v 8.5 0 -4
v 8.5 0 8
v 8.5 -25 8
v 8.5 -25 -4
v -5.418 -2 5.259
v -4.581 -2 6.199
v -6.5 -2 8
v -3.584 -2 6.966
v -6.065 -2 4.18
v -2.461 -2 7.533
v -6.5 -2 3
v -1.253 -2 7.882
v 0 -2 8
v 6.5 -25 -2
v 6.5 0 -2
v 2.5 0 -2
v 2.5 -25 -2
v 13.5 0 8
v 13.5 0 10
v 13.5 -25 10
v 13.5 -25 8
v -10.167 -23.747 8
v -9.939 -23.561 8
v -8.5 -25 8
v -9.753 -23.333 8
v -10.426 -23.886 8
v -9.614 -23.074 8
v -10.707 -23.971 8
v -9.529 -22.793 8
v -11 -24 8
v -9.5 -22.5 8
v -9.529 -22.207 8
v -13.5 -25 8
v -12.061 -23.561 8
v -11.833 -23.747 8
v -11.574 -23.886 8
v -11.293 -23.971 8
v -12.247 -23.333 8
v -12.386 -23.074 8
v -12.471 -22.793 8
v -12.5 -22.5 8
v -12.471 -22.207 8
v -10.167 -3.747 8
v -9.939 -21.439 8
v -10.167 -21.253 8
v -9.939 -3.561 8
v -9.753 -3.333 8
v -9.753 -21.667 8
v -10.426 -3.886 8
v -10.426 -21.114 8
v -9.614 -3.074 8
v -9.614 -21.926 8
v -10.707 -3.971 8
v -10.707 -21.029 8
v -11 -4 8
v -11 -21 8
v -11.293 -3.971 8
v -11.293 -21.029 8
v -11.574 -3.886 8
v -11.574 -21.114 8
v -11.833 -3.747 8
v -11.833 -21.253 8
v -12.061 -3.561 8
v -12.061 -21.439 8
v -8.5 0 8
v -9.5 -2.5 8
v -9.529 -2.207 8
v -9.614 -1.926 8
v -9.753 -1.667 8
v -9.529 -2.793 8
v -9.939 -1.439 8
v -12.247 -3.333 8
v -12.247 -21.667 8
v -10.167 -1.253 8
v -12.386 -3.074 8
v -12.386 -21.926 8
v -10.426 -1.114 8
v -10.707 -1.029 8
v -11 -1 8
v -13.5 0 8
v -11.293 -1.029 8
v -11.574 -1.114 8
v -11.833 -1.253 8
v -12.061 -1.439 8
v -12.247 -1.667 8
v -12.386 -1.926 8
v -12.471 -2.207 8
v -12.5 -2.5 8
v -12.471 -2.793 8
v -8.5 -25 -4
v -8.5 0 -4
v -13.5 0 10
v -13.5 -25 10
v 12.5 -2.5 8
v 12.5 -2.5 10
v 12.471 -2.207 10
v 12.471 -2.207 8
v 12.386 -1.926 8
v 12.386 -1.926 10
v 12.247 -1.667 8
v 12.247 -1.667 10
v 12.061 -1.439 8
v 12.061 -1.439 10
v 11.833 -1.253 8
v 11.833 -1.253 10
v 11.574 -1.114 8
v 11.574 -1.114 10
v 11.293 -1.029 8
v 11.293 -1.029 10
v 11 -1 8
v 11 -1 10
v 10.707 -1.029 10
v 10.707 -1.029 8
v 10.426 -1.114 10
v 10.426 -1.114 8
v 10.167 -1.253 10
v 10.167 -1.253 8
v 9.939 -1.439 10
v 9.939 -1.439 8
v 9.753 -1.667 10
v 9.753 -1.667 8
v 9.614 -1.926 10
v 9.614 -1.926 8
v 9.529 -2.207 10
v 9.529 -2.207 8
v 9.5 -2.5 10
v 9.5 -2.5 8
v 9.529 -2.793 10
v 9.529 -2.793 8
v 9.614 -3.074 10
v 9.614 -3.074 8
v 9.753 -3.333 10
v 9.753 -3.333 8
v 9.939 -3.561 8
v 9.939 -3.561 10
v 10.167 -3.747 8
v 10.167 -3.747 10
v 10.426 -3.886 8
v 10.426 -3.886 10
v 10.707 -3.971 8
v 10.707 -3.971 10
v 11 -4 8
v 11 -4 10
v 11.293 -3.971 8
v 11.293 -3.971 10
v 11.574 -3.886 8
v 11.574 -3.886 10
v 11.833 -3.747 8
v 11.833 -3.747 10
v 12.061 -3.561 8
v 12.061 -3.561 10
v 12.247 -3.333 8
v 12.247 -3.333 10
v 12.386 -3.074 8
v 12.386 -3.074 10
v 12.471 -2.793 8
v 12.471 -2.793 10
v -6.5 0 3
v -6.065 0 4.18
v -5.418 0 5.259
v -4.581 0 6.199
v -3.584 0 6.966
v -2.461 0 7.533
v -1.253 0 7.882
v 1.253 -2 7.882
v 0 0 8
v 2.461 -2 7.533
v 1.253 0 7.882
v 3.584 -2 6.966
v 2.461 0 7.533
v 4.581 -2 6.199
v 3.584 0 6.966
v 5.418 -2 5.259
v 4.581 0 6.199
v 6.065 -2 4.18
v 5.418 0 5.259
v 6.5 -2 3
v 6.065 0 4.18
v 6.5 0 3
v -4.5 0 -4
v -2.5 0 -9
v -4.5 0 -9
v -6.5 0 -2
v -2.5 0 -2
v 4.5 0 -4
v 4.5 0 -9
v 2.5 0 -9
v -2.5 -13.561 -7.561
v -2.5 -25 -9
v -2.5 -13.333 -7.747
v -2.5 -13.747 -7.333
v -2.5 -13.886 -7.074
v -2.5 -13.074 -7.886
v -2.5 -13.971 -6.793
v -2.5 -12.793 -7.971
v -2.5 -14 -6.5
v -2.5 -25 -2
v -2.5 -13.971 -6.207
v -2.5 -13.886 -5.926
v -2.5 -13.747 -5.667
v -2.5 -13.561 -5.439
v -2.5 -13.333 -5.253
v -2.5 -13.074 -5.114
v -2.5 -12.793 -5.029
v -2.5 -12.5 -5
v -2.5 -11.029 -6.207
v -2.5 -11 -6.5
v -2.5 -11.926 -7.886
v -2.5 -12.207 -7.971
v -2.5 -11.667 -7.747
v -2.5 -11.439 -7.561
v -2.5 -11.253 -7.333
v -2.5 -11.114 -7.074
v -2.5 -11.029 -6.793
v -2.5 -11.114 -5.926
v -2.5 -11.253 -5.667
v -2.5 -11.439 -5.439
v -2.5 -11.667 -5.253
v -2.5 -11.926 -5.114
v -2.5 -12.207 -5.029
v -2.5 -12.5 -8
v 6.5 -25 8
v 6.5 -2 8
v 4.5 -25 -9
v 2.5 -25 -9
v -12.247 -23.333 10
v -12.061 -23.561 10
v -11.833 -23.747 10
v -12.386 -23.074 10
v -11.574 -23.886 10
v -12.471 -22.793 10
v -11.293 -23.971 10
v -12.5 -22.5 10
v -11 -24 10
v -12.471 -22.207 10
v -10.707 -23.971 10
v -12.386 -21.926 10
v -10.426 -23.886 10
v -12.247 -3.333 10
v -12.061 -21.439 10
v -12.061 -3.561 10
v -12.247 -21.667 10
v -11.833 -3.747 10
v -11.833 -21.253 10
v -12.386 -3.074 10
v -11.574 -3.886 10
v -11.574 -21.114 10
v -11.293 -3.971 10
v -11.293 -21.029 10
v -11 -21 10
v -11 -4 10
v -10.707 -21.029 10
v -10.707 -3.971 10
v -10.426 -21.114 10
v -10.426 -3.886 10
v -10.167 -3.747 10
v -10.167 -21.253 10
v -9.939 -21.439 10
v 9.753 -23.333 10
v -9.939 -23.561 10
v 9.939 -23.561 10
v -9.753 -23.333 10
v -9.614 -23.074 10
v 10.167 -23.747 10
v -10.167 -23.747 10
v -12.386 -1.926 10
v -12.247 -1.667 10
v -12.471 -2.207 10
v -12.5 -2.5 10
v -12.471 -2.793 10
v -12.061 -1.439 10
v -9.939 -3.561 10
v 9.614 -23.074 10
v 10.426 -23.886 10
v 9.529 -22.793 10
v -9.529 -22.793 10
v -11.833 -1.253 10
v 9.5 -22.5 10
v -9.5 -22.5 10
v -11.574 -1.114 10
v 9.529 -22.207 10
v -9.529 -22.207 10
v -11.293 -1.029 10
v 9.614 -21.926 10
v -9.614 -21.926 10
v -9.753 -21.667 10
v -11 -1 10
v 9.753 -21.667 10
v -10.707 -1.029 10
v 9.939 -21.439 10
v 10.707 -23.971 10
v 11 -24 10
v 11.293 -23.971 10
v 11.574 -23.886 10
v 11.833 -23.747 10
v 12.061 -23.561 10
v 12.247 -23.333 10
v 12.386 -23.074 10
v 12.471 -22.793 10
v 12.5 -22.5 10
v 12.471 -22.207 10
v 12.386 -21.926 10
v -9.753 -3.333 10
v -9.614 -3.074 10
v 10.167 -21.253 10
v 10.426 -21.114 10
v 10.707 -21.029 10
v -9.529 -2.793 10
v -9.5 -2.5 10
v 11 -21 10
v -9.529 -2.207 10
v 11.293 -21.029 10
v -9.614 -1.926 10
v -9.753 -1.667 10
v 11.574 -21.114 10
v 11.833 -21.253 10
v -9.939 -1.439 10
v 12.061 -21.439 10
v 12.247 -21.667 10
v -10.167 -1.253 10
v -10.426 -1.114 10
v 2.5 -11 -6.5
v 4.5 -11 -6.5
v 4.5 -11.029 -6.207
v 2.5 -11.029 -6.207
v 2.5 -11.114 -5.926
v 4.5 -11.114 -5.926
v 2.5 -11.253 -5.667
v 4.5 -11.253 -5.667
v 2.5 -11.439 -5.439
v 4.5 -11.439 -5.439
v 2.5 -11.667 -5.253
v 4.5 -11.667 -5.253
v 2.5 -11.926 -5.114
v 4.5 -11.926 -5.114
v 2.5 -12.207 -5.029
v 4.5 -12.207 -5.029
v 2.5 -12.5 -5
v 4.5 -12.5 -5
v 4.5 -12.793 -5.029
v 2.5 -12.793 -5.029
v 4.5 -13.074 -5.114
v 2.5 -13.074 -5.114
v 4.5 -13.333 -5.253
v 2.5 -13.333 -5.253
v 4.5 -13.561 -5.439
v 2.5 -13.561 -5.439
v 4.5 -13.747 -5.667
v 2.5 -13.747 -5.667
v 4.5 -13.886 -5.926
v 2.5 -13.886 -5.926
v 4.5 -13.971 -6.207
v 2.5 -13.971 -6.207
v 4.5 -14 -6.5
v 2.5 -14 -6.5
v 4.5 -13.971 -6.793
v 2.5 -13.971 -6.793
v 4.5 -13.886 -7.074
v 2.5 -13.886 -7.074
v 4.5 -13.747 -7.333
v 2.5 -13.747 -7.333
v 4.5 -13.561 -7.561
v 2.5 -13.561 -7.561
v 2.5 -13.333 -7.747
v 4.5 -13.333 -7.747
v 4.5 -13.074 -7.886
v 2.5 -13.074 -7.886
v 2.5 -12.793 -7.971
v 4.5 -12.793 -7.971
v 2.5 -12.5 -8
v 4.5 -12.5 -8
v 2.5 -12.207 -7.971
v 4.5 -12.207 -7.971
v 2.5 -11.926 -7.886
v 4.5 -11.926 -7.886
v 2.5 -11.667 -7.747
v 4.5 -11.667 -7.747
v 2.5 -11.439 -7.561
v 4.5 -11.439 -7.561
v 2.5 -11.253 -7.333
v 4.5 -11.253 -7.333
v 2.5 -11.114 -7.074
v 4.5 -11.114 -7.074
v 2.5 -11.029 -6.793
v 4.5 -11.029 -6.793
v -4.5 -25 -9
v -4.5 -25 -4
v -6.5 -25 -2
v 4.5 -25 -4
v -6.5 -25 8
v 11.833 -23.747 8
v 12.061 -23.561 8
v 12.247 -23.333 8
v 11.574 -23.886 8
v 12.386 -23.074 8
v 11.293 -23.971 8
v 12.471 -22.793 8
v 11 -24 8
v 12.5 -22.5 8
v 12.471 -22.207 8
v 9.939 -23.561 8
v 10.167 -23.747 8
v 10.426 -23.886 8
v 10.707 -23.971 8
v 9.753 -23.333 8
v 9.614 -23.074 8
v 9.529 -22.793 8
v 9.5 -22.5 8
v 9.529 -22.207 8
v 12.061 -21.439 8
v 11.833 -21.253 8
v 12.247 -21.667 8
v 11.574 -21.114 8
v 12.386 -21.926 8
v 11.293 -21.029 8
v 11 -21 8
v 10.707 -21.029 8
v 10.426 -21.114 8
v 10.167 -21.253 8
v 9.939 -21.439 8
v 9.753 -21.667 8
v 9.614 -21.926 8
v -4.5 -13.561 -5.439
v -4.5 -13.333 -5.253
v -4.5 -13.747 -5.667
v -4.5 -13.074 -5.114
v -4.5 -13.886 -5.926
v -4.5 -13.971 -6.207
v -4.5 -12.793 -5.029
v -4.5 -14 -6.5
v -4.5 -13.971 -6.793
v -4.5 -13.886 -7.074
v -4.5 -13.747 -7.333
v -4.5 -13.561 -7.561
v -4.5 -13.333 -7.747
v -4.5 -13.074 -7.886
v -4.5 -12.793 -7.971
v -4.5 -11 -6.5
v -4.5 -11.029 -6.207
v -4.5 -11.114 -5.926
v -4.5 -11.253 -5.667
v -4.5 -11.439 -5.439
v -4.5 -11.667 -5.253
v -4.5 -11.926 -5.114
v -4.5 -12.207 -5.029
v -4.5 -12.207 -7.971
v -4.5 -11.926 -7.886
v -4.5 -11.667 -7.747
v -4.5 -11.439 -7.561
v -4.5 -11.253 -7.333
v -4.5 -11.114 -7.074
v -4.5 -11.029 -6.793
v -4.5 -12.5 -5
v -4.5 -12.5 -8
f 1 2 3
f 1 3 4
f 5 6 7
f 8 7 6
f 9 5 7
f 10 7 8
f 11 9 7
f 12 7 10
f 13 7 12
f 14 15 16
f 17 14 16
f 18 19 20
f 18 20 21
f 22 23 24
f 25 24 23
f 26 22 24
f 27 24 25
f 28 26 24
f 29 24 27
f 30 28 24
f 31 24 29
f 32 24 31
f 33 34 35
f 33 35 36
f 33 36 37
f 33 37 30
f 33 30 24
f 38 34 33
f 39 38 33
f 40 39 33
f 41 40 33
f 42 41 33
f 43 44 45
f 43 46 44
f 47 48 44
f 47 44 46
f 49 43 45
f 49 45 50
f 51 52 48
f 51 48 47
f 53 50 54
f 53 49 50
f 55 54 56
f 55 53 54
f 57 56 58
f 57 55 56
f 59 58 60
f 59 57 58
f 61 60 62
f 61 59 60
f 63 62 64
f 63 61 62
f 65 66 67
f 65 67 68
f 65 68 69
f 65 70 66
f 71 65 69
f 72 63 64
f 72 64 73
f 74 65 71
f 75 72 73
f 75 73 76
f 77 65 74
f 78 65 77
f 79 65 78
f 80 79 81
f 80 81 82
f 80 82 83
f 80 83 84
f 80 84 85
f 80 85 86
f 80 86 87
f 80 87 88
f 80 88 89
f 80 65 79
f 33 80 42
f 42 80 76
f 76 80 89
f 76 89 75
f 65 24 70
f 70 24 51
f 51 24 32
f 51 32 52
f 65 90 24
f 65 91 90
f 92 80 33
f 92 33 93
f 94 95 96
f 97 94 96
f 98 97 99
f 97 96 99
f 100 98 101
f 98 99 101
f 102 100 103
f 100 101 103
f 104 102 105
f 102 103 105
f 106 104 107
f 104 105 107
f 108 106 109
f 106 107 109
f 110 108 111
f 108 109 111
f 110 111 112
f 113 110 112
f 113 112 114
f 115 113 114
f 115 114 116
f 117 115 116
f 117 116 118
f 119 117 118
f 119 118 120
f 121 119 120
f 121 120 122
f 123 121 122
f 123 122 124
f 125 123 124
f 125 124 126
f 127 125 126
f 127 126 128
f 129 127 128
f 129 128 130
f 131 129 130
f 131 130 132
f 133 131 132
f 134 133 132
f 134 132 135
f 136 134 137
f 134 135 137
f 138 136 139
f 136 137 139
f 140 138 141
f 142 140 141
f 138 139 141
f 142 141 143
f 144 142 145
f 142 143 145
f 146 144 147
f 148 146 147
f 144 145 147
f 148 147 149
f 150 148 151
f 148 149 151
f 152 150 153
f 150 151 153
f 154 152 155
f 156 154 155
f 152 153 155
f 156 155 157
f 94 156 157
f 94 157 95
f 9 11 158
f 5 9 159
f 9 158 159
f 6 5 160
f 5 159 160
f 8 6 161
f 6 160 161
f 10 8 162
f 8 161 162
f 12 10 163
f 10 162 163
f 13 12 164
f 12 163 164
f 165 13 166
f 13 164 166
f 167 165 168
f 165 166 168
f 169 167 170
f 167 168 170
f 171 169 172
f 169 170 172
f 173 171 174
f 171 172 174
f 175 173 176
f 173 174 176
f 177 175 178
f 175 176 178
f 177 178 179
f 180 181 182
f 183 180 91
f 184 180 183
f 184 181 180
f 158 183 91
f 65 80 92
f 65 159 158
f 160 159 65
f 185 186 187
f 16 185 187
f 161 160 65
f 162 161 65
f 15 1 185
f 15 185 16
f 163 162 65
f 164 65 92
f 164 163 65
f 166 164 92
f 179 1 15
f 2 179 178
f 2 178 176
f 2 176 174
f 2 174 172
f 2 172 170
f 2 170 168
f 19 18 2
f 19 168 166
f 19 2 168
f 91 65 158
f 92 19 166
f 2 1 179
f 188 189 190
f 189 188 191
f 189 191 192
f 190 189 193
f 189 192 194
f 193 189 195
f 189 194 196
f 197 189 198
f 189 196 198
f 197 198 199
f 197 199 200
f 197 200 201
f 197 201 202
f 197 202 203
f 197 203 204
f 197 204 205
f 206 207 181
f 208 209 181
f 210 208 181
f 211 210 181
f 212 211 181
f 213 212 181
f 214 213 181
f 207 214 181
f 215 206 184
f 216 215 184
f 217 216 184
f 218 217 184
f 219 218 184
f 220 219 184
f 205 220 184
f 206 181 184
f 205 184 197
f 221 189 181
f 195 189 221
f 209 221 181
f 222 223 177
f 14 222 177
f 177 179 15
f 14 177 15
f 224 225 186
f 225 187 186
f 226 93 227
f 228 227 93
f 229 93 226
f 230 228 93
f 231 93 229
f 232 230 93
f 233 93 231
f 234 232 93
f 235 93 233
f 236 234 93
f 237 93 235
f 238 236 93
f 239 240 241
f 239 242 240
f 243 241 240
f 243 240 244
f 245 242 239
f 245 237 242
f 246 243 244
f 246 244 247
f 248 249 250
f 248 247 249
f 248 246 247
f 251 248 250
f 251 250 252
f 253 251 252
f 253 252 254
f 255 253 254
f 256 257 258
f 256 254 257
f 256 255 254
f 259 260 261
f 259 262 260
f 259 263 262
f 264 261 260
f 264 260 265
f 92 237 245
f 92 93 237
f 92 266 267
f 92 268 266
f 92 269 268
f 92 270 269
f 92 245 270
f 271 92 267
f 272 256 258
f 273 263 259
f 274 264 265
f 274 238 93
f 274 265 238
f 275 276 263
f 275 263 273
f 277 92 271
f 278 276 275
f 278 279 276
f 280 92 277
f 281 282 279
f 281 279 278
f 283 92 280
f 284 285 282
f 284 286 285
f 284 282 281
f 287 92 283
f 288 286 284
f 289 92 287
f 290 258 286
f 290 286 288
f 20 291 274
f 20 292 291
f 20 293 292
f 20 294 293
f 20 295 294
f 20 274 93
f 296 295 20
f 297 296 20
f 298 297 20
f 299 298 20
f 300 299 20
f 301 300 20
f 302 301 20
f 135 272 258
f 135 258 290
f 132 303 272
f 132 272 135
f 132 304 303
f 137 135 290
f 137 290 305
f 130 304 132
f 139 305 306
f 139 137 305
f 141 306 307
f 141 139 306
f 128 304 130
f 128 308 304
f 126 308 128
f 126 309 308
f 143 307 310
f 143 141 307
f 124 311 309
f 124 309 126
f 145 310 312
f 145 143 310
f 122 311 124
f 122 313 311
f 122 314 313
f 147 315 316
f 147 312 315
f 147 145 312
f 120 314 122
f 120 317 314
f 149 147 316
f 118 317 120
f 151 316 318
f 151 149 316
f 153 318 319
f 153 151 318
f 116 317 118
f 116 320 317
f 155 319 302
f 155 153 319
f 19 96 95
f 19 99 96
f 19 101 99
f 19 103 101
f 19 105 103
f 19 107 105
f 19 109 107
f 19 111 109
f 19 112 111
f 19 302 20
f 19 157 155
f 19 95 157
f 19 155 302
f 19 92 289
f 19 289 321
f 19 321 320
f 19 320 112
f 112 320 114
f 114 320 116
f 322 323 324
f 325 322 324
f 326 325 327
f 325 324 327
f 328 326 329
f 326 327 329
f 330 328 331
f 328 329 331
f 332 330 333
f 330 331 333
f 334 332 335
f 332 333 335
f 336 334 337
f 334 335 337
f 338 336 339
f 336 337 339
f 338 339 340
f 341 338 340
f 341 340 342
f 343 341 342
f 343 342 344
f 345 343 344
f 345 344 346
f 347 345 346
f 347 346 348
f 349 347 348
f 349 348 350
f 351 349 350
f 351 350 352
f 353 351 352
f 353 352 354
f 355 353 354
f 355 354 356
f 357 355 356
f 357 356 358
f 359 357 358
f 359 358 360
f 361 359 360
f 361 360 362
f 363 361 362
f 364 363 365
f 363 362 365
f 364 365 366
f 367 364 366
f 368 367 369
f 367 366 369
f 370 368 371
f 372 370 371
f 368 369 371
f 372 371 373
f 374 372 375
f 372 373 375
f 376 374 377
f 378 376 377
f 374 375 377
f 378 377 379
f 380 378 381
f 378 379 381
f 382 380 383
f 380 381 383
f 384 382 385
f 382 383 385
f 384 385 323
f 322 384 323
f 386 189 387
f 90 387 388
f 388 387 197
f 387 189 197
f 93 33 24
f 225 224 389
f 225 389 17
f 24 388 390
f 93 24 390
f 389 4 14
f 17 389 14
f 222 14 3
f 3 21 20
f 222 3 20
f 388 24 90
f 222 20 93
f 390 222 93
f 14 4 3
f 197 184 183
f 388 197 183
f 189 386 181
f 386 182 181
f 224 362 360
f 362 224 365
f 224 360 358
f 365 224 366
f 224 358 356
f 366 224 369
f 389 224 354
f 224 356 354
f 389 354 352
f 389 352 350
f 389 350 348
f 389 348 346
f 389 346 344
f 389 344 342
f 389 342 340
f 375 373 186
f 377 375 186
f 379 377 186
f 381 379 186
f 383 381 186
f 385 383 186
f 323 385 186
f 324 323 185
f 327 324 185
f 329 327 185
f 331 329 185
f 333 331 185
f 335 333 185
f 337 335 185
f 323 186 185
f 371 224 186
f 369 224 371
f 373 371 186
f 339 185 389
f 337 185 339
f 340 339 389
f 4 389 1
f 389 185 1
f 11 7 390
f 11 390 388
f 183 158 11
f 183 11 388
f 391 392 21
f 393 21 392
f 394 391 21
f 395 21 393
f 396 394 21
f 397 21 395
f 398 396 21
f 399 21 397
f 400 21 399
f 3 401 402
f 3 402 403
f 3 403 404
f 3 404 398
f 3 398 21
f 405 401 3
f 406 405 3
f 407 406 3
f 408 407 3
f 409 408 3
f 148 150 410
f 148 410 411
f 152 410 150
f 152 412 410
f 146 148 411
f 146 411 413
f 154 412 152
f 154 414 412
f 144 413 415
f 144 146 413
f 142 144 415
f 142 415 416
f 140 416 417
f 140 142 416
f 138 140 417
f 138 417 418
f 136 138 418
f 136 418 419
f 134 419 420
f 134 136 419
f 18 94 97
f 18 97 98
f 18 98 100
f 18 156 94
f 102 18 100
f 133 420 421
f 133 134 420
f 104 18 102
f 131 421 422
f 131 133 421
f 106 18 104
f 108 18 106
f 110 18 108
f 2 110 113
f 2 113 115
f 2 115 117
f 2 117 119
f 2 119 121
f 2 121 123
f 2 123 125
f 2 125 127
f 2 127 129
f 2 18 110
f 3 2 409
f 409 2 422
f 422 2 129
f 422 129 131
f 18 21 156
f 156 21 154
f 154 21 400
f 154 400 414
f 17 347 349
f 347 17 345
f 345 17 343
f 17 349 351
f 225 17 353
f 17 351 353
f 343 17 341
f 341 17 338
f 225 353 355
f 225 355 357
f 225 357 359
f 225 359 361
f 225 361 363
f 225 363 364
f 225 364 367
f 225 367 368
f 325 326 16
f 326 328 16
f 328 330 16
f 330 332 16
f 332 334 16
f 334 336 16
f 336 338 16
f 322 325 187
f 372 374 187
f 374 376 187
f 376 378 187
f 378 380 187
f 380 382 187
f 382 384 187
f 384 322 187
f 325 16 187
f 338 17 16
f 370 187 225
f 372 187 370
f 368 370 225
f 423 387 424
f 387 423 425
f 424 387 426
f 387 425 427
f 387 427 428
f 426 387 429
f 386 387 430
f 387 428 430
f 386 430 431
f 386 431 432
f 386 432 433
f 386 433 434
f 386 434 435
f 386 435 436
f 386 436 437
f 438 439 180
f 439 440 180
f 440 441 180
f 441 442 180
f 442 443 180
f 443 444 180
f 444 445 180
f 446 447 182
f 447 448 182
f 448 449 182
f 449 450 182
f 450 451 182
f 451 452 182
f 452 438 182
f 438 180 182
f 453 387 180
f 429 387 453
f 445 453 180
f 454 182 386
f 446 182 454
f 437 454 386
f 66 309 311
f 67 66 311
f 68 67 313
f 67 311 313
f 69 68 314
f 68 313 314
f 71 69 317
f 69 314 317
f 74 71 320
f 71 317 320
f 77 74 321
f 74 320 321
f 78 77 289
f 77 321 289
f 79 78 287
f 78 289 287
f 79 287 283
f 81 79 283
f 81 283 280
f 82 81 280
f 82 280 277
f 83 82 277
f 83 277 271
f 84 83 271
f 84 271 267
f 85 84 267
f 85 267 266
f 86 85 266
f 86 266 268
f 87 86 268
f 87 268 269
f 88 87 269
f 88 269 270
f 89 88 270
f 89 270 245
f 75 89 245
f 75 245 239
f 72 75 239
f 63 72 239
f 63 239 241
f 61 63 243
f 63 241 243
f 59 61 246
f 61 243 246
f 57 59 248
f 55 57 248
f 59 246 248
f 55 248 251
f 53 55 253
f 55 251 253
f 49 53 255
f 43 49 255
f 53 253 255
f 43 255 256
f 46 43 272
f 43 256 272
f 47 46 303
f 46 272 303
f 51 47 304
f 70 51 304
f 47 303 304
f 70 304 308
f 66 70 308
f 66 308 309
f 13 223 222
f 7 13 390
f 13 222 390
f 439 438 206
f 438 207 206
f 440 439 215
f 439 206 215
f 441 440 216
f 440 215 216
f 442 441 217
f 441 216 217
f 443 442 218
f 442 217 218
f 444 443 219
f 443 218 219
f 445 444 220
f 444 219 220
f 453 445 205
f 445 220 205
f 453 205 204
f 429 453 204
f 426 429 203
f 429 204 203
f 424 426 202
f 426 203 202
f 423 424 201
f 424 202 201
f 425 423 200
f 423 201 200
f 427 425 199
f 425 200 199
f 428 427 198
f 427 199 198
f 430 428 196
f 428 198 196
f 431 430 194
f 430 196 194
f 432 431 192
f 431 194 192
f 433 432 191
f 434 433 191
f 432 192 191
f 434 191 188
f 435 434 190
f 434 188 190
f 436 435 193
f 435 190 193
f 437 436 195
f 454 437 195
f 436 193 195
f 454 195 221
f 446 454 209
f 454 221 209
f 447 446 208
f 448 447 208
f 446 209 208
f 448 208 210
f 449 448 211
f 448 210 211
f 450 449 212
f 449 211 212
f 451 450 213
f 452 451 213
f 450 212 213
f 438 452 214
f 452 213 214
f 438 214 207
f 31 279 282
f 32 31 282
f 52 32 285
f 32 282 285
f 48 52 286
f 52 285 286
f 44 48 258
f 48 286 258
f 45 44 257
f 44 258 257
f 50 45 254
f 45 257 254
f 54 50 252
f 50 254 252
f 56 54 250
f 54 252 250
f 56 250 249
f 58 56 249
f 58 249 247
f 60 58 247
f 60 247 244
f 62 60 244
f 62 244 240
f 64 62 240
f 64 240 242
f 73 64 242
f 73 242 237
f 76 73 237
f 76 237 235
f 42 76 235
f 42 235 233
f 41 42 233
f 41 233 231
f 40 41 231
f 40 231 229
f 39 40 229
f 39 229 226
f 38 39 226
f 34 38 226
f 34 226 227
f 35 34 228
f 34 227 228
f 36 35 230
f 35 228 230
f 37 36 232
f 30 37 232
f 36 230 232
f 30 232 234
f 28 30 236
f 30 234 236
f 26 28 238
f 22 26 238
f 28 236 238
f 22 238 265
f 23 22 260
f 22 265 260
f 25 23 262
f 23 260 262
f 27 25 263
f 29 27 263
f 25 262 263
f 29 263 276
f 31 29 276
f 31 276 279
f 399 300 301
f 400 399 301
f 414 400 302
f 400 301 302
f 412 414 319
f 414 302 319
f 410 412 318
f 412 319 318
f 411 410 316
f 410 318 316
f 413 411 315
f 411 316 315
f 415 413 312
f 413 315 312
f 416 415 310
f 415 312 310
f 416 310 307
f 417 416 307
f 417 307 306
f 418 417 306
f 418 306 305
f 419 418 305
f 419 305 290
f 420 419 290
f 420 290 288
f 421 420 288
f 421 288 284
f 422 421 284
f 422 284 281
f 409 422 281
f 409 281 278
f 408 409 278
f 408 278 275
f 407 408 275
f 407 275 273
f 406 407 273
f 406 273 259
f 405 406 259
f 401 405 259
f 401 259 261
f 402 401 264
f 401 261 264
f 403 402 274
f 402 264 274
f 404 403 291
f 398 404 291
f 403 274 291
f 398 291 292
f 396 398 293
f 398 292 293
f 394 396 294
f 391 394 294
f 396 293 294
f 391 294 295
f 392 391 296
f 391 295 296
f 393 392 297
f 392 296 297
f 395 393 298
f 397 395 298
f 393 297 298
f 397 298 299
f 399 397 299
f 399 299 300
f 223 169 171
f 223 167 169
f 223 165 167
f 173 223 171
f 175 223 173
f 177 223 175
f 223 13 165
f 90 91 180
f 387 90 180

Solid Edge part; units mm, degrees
sketch "Sketch1" plane through (0, 0, 0) normal (0, -1, 0) x (1, 0, 0)
  line L0 (0, 10) -> (13.5, 10)
  line L1 (13.5, 10) -> (13.5, 8)
  line L2 (13.5, 8) -> (8.5, 8)
  line L3 (8.5, 8) -> (8.5, -4)
  line L4 (4.5, -4) -> (8.5, -4)
  line L5 (4.5, -9) -> (4.5, -4)
  line L6 (2.5, -9) -> (4.5, -9)
  line L7 (2.5, -2) -> (2.5, -9)
  line L8 (-2.5, -2) -> (2.5, -2)
  line L9 (-2.5, -9) -> (-2.5, -2)
  line L10 (-4.5, -9) -> (-2.5, -9)
  line L11 (-4.5, -4) -> (-4.5, -9)
  line L12 (-8.5, -4) -> (-4.5, -4)
  line L13 (-8.5, -4) -> (-8.5, 8)
  line L14 (-8.5, 8) -> (-13.5, 8)
  line L15 (-13.5, 8) -> (-13.5, 10)
  line L16 (-13.5, 10) -> (0, 10)
extrude "Protrusion1" add sketch "Sketch1" along normal blind 25
sketch "Sketch2" plane through (0, -25, 0.5) normal (0, -1, 0) x (1, 0, 0)
  line L0 (-6.5, 7.5) -> (-6.5, -2.5)
  line L1 (-6.5, -2.5) -> (6.5, -2.5)
  line L2 (6.5, -2.5) -> (6.5, 7.5)
  line L3 (6.5, 7.5) -> (-6.5, 7.5)
extrude "ExtrudedCutout_1" cut sketch "Sketch2" against normal blind 23
sketch "Sketch3" plane through (0, 0, 0.5) normal (0, 1, 0) x (-1, 0, 0)
  line L0 (-6.5, -2.5) -> (6.5, -2.5)
  line L1 (6.5, 2.5) -> (6.5, -2.5)
  arc A0 (0, 7.5) -> (6.5, 2.5) centre (0, 0.775) cw
  arc A1 (-6.5, 2.5) -> (0, 7.5) centre (0, 0.775) cw
  line L2 (-6.5, 2.5) -> (-6.5, -2.5)
extrude "ExtrudedCutout_2" cut sketch "Sketch3" against normal blind 2
sketch "Sketch4" plane through (0, -12.5, 10) normal (0, 0, 1) x (1, 0, 0)
  circle A0 centre (-11, 10) radius 1.5
  circle A1 centre (11, 10) radius 1.5
  circle A2 centre (11, -10) radius 1.5
  circle A3 centre (-11, -10) radius 1.5
extrude "Cutout1" cut sketch "Sketch4" against normal up to vertex (2 mm away)
sketch "Sketch5" plane through (4.5, -12.5, -6.5) normal (1, 0, 0) x (0, 1, 0)
  circle A0 centre (0, 0) radius 1.5
extrude "ExtrudedCutout_4" cut sketch "Sketch5" against normal blind 10.3838
